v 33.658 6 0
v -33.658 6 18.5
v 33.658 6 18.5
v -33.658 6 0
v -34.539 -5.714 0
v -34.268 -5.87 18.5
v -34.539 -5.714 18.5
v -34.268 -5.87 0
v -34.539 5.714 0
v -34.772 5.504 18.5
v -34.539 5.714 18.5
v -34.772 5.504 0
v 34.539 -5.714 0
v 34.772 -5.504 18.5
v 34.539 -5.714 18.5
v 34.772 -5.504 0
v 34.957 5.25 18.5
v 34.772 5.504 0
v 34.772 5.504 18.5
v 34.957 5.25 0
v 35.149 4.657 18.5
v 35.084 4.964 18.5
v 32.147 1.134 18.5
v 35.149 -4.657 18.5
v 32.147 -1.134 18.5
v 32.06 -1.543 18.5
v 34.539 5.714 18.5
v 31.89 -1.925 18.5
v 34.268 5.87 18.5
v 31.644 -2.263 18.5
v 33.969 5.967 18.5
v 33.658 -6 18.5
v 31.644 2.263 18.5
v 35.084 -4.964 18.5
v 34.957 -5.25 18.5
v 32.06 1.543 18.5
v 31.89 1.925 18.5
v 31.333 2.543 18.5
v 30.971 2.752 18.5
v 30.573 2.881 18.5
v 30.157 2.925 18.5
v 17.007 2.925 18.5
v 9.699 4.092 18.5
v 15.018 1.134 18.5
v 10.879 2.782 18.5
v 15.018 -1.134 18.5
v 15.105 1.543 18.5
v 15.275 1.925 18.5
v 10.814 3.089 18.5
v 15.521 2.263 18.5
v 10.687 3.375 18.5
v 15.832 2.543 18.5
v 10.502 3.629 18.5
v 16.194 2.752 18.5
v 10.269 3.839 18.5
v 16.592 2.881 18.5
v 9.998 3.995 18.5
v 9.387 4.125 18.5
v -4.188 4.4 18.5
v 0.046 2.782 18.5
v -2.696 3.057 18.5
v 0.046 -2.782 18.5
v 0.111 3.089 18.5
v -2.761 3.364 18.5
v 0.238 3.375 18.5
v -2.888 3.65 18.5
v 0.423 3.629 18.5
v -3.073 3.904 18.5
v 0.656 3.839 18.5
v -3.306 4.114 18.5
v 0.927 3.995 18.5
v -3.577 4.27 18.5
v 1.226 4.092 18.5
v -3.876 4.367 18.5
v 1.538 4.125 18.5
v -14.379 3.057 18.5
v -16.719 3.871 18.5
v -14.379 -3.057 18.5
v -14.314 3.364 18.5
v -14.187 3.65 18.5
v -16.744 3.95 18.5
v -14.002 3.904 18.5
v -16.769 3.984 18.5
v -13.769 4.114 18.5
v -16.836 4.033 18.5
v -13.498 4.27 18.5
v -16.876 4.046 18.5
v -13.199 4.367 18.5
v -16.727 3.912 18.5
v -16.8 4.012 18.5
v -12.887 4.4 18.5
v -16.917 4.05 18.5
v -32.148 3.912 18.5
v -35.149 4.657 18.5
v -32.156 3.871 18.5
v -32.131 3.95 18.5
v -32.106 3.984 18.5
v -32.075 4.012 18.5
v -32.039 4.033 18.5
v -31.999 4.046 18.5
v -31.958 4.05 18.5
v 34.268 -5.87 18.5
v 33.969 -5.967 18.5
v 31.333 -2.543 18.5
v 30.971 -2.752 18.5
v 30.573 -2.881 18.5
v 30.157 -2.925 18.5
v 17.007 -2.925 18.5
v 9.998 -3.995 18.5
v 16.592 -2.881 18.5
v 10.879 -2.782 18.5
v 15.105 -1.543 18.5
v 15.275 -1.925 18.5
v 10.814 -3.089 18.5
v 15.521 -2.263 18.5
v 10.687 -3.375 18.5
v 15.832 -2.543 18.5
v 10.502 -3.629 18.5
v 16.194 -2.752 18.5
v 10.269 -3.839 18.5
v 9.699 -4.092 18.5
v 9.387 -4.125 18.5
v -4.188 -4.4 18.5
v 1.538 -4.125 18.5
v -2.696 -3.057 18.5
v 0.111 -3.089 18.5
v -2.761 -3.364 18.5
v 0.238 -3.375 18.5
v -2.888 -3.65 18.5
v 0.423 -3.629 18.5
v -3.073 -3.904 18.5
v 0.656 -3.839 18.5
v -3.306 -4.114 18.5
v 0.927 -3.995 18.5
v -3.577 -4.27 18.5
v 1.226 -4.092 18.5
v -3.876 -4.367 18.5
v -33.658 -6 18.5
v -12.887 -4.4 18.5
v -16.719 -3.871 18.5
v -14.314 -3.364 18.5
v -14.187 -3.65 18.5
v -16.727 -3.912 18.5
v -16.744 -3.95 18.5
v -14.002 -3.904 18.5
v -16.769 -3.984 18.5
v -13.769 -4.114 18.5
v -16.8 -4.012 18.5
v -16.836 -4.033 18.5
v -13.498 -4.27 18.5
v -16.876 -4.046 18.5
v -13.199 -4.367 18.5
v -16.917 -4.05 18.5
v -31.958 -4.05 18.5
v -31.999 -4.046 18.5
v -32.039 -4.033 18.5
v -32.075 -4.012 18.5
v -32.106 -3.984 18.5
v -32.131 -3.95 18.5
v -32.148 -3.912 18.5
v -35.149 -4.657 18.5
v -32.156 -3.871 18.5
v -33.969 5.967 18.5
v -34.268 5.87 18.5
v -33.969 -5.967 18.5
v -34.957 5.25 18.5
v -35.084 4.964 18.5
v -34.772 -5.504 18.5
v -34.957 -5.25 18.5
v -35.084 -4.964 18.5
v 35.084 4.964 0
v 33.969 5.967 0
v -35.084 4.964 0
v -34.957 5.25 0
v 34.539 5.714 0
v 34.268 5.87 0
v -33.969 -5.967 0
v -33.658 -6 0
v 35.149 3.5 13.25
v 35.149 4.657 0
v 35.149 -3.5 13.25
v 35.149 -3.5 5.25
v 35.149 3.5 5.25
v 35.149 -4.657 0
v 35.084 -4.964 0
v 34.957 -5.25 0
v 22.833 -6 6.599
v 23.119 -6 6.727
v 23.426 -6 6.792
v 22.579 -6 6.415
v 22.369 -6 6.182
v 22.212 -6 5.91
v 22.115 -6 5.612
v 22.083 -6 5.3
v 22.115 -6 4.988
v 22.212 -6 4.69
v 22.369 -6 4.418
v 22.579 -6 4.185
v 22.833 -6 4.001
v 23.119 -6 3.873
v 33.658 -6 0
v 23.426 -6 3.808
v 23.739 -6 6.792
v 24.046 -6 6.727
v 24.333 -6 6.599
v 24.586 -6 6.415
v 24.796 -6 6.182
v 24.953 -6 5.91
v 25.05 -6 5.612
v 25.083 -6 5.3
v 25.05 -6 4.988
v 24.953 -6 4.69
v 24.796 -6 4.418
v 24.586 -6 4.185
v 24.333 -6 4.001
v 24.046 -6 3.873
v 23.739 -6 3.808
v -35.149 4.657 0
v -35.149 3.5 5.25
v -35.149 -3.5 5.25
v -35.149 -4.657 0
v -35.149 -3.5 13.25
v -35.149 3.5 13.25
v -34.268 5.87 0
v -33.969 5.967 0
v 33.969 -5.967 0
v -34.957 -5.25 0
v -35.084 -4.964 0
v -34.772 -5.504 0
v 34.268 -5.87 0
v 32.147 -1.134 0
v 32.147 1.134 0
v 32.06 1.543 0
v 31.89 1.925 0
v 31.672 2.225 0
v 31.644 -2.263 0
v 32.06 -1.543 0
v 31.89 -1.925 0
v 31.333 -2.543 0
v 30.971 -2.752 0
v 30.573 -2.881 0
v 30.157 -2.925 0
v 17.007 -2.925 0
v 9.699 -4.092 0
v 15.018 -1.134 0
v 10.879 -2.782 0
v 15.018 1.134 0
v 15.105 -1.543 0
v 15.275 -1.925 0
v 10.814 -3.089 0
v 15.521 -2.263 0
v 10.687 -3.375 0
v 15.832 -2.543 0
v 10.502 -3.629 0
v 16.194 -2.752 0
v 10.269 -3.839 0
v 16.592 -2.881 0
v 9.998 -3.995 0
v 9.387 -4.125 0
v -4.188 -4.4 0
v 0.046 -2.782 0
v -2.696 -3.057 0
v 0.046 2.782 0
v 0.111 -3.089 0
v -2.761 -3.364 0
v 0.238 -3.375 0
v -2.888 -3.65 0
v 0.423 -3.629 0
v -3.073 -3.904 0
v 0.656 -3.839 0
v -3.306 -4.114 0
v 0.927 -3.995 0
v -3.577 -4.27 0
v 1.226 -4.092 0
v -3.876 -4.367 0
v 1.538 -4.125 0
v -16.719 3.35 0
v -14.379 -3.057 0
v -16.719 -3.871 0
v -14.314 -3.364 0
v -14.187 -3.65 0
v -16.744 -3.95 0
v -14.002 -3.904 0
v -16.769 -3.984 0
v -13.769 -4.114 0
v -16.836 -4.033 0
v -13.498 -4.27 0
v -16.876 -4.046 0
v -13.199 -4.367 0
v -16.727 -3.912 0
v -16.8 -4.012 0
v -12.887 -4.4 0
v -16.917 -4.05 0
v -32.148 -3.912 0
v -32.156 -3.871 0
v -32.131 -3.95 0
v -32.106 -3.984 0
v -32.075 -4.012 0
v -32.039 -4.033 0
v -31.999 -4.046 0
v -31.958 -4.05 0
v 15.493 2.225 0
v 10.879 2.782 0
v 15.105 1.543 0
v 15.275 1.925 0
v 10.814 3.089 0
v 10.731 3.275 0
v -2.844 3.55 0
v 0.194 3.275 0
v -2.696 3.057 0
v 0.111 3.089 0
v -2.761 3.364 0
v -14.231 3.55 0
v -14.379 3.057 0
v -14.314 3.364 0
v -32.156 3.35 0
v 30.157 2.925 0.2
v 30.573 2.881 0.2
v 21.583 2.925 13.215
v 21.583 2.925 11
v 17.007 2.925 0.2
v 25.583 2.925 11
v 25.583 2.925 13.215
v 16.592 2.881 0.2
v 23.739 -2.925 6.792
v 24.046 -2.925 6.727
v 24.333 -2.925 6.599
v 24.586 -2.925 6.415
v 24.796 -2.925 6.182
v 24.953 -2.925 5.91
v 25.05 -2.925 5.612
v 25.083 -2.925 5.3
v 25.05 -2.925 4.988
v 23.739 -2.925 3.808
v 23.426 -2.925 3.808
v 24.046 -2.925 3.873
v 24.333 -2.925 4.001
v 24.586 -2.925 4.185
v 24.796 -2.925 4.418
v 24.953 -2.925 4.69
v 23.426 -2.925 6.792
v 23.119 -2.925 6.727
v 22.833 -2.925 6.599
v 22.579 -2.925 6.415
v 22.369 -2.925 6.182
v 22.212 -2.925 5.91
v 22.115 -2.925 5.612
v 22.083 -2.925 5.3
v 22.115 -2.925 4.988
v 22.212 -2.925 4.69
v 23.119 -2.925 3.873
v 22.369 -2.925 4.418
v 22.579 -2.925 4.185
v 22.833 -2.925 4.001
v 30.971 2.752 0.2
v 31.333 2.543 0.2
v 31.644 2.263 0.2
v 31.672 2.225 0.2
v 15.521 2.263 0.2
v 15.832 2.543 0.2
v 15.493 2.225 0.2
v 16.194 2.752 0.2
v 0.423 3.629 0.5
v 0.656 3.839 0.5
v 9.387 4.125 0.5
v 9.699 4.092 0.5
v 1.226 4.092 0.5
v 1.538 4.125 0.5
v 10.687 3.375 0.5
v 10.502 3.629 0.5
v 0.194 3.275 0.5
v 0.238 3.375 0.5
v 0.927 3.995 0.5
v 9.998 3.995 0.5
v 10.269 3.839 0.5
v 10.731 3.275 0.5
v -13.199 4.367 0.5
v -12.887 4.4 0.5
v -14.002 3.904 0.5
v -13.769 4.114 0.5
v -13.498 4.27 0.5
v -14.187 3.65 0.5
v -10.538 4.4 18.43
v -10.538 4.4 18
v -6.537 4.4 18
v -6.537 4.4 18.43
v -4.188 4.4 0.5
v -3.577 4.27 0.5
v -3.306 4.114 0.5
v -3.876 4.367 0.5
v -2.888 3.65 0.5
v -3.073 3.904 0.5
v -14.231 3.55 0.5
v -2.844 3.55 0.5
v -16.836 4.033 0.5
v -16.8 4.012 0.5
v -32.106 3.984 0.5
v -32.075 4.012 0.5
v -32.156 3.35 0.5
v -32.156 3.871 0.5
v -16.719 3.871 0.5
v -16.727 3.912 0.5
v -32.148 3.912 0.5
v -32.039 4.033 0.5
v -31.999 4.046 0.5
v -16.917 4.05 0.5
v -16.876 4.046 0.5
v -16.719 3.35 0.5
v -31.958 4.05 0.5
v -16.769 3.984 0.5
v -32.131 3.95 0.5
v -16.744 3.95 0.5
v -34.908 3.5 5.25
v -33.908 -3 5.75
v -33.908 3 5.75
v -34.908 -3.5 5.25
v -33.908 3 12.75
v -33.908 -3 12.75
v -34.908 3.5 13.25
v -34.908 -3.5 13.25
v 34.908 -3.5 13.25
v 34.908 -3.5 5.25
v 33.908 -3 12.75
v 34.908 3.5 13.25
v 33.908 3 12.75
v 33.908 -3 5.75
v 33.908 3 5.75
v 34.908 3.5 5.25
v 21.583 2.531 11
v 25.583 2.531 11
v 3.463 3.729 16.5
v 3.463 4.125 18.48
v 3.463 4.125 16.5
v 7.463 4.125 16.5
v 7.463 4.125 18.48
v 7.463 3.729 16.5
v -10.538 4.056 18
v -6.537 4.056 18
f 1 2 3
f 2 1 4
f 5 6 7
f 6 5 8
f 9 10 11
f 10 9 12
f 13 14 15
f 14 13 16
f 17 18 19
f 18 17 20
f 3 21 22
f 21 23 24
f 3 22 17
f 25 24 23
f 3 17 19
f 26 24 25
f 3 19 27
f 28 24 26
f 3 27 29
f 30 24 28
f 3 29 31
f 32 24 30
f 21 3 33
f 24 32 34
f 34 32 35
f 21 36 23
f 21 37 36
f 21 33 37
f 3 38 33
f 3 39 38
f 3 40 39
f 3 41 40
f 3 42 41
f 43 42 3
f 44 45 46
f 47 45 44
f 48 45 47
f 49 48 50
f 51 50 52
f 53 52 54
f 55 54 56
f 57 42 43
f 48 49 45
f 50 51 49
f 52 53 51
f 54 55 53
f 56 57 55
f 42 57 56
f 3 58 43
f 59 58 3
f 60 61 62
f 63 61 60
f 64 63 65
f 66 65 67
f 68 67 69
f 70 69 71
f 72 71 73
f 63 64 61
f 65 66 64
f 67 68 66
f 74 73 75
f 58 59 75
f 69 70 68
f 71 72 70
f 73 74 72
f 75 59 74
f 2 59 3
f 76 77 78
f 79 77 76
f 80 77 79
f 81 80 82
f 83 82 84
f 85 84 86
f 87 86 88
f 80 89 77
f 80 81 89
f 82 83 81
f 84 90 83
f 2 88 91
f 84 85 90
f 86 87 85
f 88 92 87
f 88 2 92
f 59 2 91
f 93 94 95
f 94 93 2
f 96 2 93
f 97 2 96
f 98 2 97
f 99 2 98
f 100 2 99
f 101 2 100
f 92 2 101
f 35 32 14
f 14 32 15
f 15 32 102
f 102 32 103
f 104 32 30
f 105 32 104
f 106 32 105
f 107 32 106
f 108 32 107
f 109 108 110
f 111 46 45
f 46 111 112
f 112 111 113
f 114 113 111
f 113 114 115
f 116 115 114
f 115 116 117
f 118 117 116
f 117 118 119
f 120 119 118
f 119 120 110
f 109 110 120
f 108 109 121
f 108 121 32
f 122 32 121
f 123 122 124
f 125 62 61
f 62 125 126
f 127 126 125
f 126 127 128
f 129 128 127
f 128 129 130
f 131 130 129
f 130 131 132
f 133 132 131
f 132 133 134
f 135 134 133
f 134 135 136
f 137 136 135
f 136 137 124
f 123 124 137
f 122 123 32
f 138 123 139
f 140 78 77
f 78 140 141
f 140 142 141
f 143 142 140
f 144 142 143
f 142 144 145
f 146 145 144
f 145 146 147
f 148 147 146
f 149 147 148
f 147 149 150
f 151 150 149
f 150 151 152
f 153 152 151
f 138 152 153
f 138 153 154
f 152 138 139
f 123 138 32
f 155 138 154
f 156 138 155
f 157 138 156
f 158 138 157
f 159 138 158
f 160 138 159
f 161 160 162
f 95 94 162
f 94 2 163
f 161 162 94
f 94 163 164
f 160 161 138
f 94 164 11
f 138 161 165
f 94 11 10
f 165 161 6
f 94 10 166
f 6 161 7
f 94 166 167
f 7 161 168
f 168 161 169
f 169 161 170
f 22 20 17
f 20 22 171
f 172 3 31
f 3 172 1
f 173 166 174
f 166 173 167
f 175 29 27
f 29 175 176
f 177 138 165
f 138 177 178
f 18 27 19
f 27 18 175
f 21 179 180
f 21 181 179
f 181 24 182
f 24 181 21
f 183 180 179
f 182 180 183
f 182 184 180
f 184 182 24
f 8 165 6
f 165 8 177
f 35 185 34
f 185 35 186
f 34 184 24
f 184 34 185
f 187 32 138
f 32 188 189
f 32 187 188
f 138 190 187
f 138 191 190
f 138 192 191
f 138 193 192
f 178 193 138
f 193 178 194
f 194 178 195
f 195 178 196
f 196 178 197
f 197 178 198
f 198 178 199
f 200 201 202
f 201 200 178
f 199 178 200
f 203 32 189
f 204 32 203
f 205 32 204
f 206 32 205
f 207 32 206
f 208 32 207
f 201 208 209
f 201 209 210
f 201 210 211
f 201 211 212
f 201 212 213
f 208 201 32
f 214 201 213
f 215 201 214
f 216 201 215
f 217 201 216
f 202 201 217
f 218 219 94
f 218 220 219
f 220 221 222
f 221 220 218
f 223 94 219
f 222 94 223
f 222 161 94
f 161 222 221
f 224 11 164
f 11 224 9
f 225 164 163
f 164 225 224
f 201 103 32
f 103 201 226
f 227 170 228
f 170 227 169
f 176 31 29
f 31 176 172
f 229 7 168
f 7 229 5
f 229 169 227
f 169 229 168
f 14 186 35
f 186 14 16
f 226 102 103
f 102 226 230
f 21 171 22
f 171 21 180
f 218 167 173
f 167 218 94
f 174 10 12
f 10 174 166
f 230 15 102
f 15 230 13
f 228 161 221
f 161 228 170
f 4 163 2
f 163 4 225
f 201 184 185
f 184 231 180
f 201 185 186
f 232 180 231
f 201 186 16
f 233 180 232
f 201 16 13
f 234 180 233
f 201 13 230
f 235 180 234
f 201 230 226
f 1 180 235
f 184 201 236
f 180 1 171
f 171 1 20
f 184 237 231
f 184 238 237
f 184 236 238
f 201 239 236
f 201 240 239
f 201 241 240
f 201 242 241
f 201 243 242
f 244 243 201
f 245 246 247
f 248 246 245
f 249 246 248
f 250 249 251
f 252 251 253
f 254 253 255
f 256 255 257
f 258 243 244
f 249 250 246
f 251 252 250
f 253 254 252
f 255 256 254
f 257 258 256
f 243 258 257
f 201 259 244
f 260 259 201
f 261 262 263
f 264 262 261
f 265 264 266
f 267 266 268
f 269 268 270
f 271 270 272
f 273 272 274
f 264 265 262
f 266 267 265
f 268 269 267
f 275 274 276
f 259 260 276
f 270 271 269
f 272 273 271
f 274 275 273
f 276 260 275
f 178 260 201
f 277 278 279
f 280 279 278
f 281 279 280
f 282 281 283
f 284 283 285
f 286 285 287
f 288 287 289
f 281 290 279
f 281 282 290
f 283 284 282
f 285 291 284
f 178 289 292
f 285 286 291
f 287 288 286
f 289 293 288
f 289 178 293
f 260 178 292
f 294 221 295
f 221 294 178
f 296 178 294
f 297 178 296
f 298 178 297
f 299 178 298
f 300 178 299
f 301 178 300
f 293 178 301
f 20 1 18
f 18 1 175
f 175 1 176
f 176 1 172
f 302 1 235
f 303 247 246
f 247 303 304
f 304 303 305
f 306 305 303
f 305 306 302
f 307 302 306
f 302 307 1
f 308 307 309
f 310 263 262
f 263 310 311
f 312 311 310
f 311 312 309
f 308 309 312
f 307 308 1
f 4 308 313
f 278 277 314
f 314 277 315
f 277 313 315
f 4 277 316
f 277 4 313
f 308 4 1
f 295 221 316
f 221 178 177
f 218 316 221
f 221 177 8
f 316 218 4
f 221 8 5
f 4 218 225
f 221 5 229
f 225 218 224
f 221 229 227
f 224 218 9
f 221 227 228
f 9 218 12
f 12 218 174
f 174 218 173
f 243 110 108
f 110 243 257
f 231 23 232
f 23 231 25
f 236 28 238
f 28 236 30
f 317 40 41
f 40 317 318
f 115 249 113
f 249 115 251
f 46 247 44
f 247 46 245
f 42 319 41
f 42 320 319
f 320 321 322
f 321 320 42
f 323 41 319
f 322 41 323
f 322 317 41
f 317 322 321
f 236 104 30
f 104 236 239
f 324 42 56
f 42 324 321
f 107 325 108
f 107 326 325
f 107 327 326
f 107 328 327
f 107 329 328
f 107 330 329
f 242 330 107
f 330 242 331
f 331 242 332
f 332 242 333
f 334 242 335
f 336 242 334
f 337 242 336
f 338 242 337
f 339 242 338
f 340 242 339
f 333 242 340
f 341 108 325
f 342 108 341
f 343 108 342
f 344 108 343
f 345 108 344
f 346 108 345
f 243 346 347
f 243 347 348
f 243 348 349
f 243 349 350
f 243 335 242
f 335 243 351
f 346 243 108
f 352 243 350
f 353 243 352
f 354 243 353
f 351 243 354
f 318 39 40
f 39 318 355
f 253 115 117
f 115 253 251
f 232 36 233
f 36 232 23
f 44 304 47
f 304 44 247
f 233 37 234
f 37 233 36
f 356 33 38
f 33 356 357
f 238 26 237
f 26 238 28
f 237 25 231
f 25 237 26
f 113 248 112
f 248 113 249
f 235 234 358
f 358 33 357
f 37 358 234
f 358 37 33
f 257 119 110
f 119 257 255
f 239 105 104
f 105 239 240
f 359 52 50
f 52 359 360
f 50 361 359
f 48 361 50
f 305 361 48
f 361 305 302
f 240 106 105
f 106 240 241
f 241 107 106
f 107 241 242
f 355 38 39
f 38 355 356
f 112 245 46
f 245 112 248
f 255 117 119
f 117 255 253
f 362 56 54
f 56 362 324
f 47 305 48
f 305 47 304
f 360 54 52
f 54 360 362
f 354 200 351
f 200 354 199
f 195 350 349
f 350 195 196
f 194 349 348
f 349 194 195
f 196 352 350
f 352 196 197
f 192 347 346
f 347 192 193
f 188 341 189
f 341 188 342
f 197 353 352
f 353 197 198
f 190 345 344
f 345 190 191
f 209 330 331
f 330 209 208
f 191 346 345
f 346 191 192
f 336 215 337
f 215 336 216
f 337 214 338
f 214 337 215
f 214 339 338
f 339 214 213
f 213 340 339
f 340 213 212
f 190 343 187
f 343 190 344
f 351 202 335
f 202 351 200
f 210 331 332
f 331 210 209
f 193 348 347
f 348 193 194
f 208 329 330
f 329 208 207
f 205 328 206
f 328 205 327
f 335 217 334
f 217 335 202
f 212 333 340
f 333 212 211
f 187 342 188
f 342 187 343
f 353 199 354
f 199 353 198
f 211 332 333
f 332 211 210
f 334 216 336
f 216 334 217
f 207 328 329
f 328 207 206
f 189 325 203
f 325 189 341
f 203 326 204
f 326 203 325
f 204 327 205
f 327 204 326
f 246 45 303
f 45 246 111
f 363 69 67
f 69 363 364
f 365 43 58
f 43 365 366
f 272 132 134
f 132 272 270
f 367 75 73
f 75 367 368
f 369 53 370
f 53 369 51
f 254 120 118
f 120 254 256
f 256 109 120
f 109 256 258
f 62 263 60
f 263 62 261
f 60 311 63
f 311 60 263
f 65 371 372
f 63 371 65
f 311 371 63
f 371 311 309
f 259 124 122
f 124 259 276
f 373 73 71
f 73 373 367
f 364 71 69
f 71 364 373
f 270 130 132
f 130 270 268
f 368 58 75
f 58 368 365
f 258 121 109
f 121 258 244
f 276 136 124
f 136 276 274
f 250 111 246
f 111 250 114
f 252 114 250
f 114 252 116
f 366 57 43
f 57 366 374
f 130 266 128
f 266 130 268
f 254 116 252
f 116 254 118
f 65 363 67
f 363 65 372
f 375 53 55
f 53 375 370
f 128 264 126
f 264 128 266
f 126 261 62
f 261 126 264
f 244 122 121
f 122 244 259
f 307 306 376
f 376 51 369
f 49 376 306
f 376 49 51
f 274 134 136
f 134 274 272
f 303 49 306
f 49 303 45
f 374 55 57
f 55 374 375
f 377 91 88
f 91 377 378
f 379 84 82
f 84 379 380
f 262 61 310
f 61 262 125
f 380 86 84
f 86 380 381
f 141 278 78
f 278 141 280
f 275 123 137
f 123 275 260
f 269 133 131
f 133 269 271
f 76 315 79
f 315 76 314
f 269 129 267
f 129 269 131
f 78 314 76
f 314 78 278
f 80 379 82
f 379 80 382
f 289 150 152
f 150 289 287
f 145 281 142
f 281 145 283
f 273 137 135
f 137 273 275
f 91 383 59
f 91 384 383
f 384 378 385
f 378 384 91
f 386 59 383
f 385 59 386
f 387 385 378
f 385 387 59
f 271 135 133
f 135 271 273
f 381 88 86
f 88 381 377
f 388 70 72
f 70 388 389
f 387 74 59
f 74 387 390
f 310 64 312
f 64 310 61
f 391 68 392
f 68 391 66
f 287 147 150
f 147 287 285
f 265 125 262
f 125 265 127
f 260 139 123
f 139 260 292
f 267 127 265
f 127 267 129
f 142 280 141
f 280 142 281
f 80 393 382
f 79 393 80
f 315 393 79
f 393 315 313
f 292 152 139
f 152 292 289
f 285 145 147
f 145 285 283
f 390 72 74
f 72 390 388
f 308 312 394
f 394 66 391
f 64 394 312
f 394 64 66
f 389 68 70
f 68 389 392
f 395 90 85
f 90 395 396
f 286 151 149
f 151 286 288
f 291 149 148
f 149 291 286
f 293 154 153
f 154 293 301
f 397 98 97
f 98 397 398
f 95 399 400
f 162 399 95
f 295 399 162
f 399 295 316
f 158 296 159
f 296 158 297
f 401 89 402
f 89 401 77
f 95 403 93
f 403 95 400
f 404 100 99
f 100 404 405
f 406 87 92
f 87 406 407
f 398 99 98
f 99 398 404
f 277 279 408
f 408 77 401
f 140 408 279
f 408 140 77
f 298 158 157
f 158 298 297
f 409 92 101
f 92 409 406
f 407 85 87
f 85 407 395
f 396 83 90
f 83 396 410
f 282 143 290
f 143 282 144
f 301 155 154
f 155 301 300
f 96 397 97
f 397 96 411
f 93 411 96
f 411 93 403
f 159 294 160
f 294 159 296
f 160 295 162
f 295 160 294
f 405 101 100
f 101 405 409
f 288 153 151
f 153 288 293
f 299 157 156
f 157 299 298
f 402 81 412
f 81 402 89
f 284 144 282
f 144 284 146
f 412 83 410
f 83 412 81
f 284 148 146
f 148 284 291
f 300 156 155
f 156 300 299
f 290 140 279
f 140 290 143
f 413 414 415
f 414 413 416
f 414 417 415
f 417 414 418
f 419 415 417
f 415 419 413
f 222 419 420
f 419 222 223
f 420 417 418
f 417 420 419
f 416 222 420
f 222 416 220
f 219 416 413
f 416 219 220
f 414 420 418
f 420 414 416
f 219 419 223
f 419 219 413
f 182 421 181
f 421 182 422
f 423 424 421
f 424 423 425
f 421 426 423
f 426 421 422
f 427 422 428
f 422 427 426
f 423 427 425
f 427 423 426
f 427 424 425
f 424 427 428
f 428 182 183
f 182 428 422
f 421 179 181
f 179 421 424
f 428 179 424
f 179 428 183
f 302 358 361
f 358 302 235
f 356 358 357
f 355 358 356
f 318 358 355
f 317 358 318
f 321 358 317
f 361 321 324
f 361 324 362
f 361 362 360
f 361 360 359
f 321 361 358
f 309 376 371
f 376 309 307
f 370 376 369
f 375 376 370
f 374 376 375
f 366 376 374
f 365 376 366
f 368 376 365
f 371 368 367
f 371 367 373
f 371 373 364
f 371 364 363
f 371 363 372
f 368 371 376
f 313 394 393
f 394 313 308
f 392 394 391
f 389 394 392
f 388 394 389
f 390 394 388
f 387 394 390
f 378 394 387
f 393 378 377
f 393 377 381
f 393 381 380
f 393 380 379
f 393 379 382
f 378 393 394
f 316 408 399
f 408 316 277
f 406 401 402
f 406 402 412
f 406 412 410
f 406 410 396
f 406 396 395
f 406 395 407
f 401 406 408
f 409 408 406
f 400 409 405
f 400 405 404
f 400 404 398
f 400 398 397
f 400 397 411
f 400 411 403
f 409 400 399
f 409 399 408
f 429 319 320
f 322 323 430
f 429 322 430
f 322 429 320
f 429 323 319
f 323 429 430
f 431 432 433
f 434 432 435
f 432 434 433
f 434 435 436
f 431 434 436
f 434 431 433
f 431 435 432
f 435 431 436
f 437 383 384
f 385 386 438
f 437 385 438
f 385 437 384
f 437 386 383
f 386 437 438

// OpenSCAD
// Original concept and design by biludavis http://www.thingiverse.com/thing:202491
// Parametricly recreated in OpenSCAD by Jim Shank
// 2016-07-27   -Initial release in SCAD
// 2016-08-01   -Broke out variables into customizer friendly sections 
// 2016-08-04   -Refactored repeatable code into modules
//              -Converted cable stops to wedges (used atan(), very fancy)
// 2016-08-17   -Fixed Magsafe2 cable stop positioning and size calculations
// 2016-08-29   -Added logic to adjust the cable channel height based on cablestop existence
//              -Getting away from camelCase in favor of underscore_seperation

//use <ruler.scad> 
// preview[view:north west, tilt:top]

/* [Settings] */
// If you are having problems with ABS curling
add_helper_discs = "no"; //[yes:Add Helper Discs,no:No Helper Discs]
// Magsafe 2 dimensions

magsafe_width = 17.15;
magsafe_height = 5.85;
magsafe_depth = 10.8;

// Thunderbolt 1 dimensions

tb1_width = 10.85;
tb1_height = 7.95;
tb1_depth = 16;

// Thunderbolt 2 dimensions

tb2_width = 11.7;
tb2_height = 8.5;
tb2_depth = 17.5;

// USB dimensions

usb_width = 15.44;
usb_height = 8.1;
usb_depth = 20;

//%ruler(length = 30); //, t=[tb1_center+cablestop_width/2,body_thickness/2,-(tb1_height/2)], r=[0,0,180]);

/* [Cable Stops (Advanced)] */

tb1_fillet = 1.5;
tb1_endstop_depth = 0.5;
tb1_endstop_height = 0.9;

tb2_fillet = 1.5;
tb2_endstop_depth = 0.5;
tb2_endstop_height = 0.9;

usb_fillet = 0.2;
usb_endstop_depth = 0.5;
usb_endstop_height = 0.9;

magsafe_fillet = 2;
magsafe_endstop_depth = 0.2;
magsafe_endstop_height = 0.7;

magsafe_light_hole_offset = 5.3;
magsafe_light_hole_radius = 1.5;
// Endstops are small stoppers at the end of the connector channel
// that keep the cable from pulling through

endstop_depth = 0.5;
endstop_width = 6;
endstop_height = 0.2;
// Cable stops keep the cable from backing out

cablestop_width = 4;
cablestop_depth = 2.25;
cablestop_height = 0.4;
cablestop_clearance = 0.1;

/* [Port Offsets (Advanced)] */
magsafe_to_tb1_offset = 18.12;
tb1_to_tb2_offset = 14;
tb2_to_usb_offset = 15.9;

/* [Hidden] */
// Connector holder body settings
body_height = 12; //default 12
body_thickness = 18.5;
side_thickness = 3; //default 3
body_fillet = 1.5;

// Adjust this to 0.01 to preview correctly in OpenSCAD
render_fix = 0.01;

// Width of the connector body is a sum of all of the connector offsets + the side thicknesses
body_width = side_thickness+(magsafe_width/2)+magsafe_to_tb1_offset+tb1_to_tb2_offset+tb2_to_usb_offset+(usb_width/2)+side_thickness;
magsafe_center = -(body_width/2 - side_thickness-magsafe_width/2);
tb1_center = magsafe_center + magsafe_to_tb1_offset;
tb2_center = tb1_center + tb1_to_tb2_offset;
usb_center = tb2_center + tb2_to_usb_offset;

// Main Method
rotate([90,180,0]) { // Align for printing
    translate([0,-(body_thickness/2),0]) {
        body();
        endstops();
        cablestops();
        if (add_helper_discs == "yes") {
            // upper left
            draw_helper_discs();
            // lower left
            mirror([1,0,0]) {
                draw_helper_discs();
            }
            // upper right
            mirror([0,0,1]) {
                draw_helper_discs();
            }
            // lower right
            mirror([1,0,0]) {
                mirror([0,0,1]) {
                    draw_helper_discs();
                }
            }
        }
    }
}
module body() { // Main body with cable head channels
    difference() {
        // Draw the connector body
        roundedcube([body_width,body_thickness,body_height], radius = body_fillet, apply_to = "y", center = true);
        // Offset magsafe hole
        translate([magsafe_center,0,0]) {
        // Draw magsafe connector
            echo("Actual magsafe dimentions W:", magsafe_width, " D:", body_thickness + render_fix, " H:", magsafe_height);
           roundedcube([magsafe_width,body_thickness + render_fix,magsafe_height],radius = magsafe_fillet, apply_to = "y", center = true);
        }
        //Magsafe charging indicator light hole
        translate([magsafe_center,body_thickness/2-magsafe_light_hole_offset,magsafe_height/2+(body_height/2-magsafe_height/2)/2]) {
           cylinder(h=body_height/2-magsafe_height/2+render_fix,r1=magsafe_light_hole_radius, r2=magsafe_light_hole_radius, center = true, $fn=30);
        }
        // TB1 connector channel
        draw_cable_channel(tb1_center, tb1_width, tb1_height, tb1_depth, tb1_fillet, "TB1");
        // TB2 connector channel
        draw_cable_channel(tb2_center, tb2_width, tb2_height, tb2_depth, tb2_fillet, "TB2");
        // USB connector channel
        draw_cable_channel(usb_center, usb_width, usb_height, usb_depth, usb_fillet, "USB");
        // Grips
        draw_grip(); // right grip
        mirror(1,0,0) {
            draw_grip(); // left grip
        }
    }
}

module endstops() { //End stops keep the cable from coming out the Macbook end
    color("blue") {
        // Magsafe Endstop - This one is special since we don't increase the cable height to accomidate the cable stop
        translate([magsafe_center,body_thickness/2 - magsafe_endstop_depth/2,-(magsafe_height/2-magsafe_endstop_height/2)]) {
            cube([magsafe_width, magsafe_endstop_depth, magsafe_endstop_height], center = true);
        }
        // TB1 Endstop
        draw_endstop(tb1_center, tb1_endstop_height, tb1_endstop_depth, tb1_height, tb1_width);
        // TB2 Endstop
        draw_endstop(tb2_center, tb2_endstop_height, tb2_endstop_depth, tb2_height, tb2_width);
        // USB Endstop
        draw_endstop(usb_center, usb_endstop_height, usb_endstop_depth, usb_height, usb_width);
    }
}
module cablestops() {// Cable stops in the middle to keep the cable from backing out
    color("green") {
        // Magsafe2 Cable Stop
        translate([magsafe_center,body_thickness/2-magsafe_endstop_depth-magsafe_depth-cablestop_depth/2,-(magsafe_height/2)+cablestop_height/2]) {
            difference() {
                cube([cablestop_width, cablestop_depth, cablestop_height], center = true);
                translate([0,0,cablestop_height/2 + .2]) rotate([atan(cablestop_height/(cablestop_depth)),0,0]) cube([cablestop_width + render_fix, cablestop_depth + 1, cablestop_height + .4], center = true);
            }
        }
        // TB1 Cable Stop
        draw_cablestop(tb1_center, tb1_endstop_depth, tb1_height, tb1_depth);
        // TB2 Cable Stop
        draw_cablestop(tb2_center, tb2_endstop_depth, tb2_height, tb2_depth);
        // USB Cable Stop
        draw_cablestop(usb_center, usb_endstop_depth, usb_height, usb_depth);
    }
}
// Helper Modules
module draw_helper_discs() { // Corner discs for ABS prints that tend to lift at the edges
    translate([body_width/2,body_thickness/2-.1,body_height/2]) {
        rotate([90,0,0]) {
            cylinder(h=0.2,r1=3, r2=3, center = true, $fn=30);
        }
    }
}
module draw_cable_channel(channel_center, cable_width, cable_height, cable_depth, cable_fillet, cable_name) {
    //TODO - Logic to size connector height based on cablestop presense 
    channel_depth = endstop_depth+cable_depth;
           
    //Offset hole
    translate([channel_center,0,0]) {
        // Draw connector channel
        if ( body_thickness >= channel_depth) {
        // increase the height of the channel to accommodate the cablestop
            echo("Actual ", cable_name, " dimentions W:", cable_width, " D: ", body_thickness + render_fix, " H: ", cable_height+cablestop_height-cablestop_clearance);
            roundedcube([cable_width,body_thickness + render_fix,cable_height+cablestop_height-cablestop_clearance],radius = cable_fillet, apply_to = "y",center = true);
        }
        else {
            // don't increase the height of the channel to accommodate the cablestop
             echo("Actual ", cable_name, " dimentions W:", cable_width, " D: ", body_thickness + render_fix, " H: ", cable_height);
            roundedcube([cable_width,body_thickness + render_fix,cable_height],radius = cable_fillet, apply_to = "y",center = true);
        }
    }           
}
module draw_endstop(center, endstop_height, endstop_depth, connectorHeight, connectorWidth) {
    translate([center,body_thickness/2 - endstop_depth/2,-(connectorHeight/2)+endstop_height/2-cablestop_height/2]) {
            cube([connectorWidth, endstop_depth, endstop_height], center = true);
    }
}  

module draw_cablestop(center, endstop_depth, connectorHeight, connectorDepth ) {
    cablestop_offset = endstop_depth+connectorDepth+cablestop_depth;
        // Trim the depth of the cablestop if it would overhang the connector body
        if (cablestop_offset - body_thickness > 0) {
            cablestopOffset = cablestop_offset - body_thickness;
            translate([center,body_thickness/2-endstop_depth-connectorDepth-cablestop_depth/2+cablestopOffset/2,-(connectorHeight/2)+cablestop_clearance/2]) {
                difference() {
                    cube([cablestop_width, cablestop_depth-cablestopOffset, cablestop_height], center=true);
                    translate([0,0,cablestop_height/2]) rotate([atan(cablestop_height/(cablestop_depth-cablestopOffset)),0,0]) cube([cablestop_width + render_fix, cablestop_depth, cablestop_height], center=true);
                }
            }
        } 
        else { // if there is no overhang
            translate([center,body_thickness/2-endstop_depth-connectorDepth-cablestop_depth/2,-(connectorHeight/2)+cablestop_clearance/2]) {
                difference() {
                    cube([cablestop_width, cablestop_depth, cablestop_height], center=true);
                    translate([0,0,cablestop_height/2]) rotate([atan(cablestop_height/(cablestop_depth)),0,0]) cube([cablestop_width+render_fix, cablestop_depth+1, cablestop_height], center=true);
                }
            }
             
        }
}

module draw_grip() {
    hull() {
            translate([body_width/2,0,0])
                cube([.5,8,7], center = true);
            translate([body_width/2-1,0,0])
                cube([.5,7,6], center = true);
    }
}
module roundedcube(size = [1, 1, 1], center = false, radius = 0.5, apply_to = "all") { //roundedcube by Daniel Upshaw https://danielupshaw.com/openscad-rounded-corners/
    $fs = 0.01;
	// If single value, convert to [x, y, z] vector
	size = (size[0] == undef) ? [size, size, size] : size;

	translate_min = radius;
	translate_xmax = size[0] - radius;
	translate_ymax = size[1] - radius;
	translate_zmax = size[2] - radius;

	diameter = radius * 2;

	module build_point(type = "sphere", rotate = [0, 0, 0]) {
		if (type == "sphere") {
			sphere(r = radius);
		} else if (type == "cylinder") {
			rotate(a = rotate)
			cylinder(h = diameter, r = radius, center = true);
		}
	}

	obj_translate = (center == false) ?
		[0, 0, 0] : [
			-(size[0] / 2),
			-(size[1] / 2),
			-(size[2] / 2)
		];

	translate(v = obj_translate) {
		hull() {
			for (translate_x = [translate_min, translate_xmax]) {
				x_at = (translate_x == translate_min) ? "min" : "max";
				for (translate_y = [translate_min, translate_ymax]) {
					y_at = (translate_y == translate_min) ? "min" : "max";
					for (translate_z = [translate_min, translate_zmax]) {
						z_at = (translate_z == translate_min) ? "min" : "max";

						translate(v = [translate_x, translate_y, translate_z])
						if (
							(apply_to == "all") ||
							(apply_to == "xmin" && x_at == "min") || (apply_to == "xmax" && x_at == "max") ||
							(apply_to == "ymin" && y_at == "min") || (apply_to == "ymax" && y_at == "max") ||
							(apply_to == "zmin" && z_at == "min") || (apply_to == "zmax" && z_at == "max")
						) {
							build_point("sphere");
						} else {
							rotate = 
								(apply_to == "xmin" || apply_to == "xmax" || apply_to == "x") ? [0, 90, 0] : (
								(apply_to == "ymin" || apply_to == "ymax" || apply_to == "y") ? [90, 90, 0] :
								[0, 0, 0]
							);
							build_point("cylinder", rotate);
						}
					}
				}
			}
		}
	}
}
   
